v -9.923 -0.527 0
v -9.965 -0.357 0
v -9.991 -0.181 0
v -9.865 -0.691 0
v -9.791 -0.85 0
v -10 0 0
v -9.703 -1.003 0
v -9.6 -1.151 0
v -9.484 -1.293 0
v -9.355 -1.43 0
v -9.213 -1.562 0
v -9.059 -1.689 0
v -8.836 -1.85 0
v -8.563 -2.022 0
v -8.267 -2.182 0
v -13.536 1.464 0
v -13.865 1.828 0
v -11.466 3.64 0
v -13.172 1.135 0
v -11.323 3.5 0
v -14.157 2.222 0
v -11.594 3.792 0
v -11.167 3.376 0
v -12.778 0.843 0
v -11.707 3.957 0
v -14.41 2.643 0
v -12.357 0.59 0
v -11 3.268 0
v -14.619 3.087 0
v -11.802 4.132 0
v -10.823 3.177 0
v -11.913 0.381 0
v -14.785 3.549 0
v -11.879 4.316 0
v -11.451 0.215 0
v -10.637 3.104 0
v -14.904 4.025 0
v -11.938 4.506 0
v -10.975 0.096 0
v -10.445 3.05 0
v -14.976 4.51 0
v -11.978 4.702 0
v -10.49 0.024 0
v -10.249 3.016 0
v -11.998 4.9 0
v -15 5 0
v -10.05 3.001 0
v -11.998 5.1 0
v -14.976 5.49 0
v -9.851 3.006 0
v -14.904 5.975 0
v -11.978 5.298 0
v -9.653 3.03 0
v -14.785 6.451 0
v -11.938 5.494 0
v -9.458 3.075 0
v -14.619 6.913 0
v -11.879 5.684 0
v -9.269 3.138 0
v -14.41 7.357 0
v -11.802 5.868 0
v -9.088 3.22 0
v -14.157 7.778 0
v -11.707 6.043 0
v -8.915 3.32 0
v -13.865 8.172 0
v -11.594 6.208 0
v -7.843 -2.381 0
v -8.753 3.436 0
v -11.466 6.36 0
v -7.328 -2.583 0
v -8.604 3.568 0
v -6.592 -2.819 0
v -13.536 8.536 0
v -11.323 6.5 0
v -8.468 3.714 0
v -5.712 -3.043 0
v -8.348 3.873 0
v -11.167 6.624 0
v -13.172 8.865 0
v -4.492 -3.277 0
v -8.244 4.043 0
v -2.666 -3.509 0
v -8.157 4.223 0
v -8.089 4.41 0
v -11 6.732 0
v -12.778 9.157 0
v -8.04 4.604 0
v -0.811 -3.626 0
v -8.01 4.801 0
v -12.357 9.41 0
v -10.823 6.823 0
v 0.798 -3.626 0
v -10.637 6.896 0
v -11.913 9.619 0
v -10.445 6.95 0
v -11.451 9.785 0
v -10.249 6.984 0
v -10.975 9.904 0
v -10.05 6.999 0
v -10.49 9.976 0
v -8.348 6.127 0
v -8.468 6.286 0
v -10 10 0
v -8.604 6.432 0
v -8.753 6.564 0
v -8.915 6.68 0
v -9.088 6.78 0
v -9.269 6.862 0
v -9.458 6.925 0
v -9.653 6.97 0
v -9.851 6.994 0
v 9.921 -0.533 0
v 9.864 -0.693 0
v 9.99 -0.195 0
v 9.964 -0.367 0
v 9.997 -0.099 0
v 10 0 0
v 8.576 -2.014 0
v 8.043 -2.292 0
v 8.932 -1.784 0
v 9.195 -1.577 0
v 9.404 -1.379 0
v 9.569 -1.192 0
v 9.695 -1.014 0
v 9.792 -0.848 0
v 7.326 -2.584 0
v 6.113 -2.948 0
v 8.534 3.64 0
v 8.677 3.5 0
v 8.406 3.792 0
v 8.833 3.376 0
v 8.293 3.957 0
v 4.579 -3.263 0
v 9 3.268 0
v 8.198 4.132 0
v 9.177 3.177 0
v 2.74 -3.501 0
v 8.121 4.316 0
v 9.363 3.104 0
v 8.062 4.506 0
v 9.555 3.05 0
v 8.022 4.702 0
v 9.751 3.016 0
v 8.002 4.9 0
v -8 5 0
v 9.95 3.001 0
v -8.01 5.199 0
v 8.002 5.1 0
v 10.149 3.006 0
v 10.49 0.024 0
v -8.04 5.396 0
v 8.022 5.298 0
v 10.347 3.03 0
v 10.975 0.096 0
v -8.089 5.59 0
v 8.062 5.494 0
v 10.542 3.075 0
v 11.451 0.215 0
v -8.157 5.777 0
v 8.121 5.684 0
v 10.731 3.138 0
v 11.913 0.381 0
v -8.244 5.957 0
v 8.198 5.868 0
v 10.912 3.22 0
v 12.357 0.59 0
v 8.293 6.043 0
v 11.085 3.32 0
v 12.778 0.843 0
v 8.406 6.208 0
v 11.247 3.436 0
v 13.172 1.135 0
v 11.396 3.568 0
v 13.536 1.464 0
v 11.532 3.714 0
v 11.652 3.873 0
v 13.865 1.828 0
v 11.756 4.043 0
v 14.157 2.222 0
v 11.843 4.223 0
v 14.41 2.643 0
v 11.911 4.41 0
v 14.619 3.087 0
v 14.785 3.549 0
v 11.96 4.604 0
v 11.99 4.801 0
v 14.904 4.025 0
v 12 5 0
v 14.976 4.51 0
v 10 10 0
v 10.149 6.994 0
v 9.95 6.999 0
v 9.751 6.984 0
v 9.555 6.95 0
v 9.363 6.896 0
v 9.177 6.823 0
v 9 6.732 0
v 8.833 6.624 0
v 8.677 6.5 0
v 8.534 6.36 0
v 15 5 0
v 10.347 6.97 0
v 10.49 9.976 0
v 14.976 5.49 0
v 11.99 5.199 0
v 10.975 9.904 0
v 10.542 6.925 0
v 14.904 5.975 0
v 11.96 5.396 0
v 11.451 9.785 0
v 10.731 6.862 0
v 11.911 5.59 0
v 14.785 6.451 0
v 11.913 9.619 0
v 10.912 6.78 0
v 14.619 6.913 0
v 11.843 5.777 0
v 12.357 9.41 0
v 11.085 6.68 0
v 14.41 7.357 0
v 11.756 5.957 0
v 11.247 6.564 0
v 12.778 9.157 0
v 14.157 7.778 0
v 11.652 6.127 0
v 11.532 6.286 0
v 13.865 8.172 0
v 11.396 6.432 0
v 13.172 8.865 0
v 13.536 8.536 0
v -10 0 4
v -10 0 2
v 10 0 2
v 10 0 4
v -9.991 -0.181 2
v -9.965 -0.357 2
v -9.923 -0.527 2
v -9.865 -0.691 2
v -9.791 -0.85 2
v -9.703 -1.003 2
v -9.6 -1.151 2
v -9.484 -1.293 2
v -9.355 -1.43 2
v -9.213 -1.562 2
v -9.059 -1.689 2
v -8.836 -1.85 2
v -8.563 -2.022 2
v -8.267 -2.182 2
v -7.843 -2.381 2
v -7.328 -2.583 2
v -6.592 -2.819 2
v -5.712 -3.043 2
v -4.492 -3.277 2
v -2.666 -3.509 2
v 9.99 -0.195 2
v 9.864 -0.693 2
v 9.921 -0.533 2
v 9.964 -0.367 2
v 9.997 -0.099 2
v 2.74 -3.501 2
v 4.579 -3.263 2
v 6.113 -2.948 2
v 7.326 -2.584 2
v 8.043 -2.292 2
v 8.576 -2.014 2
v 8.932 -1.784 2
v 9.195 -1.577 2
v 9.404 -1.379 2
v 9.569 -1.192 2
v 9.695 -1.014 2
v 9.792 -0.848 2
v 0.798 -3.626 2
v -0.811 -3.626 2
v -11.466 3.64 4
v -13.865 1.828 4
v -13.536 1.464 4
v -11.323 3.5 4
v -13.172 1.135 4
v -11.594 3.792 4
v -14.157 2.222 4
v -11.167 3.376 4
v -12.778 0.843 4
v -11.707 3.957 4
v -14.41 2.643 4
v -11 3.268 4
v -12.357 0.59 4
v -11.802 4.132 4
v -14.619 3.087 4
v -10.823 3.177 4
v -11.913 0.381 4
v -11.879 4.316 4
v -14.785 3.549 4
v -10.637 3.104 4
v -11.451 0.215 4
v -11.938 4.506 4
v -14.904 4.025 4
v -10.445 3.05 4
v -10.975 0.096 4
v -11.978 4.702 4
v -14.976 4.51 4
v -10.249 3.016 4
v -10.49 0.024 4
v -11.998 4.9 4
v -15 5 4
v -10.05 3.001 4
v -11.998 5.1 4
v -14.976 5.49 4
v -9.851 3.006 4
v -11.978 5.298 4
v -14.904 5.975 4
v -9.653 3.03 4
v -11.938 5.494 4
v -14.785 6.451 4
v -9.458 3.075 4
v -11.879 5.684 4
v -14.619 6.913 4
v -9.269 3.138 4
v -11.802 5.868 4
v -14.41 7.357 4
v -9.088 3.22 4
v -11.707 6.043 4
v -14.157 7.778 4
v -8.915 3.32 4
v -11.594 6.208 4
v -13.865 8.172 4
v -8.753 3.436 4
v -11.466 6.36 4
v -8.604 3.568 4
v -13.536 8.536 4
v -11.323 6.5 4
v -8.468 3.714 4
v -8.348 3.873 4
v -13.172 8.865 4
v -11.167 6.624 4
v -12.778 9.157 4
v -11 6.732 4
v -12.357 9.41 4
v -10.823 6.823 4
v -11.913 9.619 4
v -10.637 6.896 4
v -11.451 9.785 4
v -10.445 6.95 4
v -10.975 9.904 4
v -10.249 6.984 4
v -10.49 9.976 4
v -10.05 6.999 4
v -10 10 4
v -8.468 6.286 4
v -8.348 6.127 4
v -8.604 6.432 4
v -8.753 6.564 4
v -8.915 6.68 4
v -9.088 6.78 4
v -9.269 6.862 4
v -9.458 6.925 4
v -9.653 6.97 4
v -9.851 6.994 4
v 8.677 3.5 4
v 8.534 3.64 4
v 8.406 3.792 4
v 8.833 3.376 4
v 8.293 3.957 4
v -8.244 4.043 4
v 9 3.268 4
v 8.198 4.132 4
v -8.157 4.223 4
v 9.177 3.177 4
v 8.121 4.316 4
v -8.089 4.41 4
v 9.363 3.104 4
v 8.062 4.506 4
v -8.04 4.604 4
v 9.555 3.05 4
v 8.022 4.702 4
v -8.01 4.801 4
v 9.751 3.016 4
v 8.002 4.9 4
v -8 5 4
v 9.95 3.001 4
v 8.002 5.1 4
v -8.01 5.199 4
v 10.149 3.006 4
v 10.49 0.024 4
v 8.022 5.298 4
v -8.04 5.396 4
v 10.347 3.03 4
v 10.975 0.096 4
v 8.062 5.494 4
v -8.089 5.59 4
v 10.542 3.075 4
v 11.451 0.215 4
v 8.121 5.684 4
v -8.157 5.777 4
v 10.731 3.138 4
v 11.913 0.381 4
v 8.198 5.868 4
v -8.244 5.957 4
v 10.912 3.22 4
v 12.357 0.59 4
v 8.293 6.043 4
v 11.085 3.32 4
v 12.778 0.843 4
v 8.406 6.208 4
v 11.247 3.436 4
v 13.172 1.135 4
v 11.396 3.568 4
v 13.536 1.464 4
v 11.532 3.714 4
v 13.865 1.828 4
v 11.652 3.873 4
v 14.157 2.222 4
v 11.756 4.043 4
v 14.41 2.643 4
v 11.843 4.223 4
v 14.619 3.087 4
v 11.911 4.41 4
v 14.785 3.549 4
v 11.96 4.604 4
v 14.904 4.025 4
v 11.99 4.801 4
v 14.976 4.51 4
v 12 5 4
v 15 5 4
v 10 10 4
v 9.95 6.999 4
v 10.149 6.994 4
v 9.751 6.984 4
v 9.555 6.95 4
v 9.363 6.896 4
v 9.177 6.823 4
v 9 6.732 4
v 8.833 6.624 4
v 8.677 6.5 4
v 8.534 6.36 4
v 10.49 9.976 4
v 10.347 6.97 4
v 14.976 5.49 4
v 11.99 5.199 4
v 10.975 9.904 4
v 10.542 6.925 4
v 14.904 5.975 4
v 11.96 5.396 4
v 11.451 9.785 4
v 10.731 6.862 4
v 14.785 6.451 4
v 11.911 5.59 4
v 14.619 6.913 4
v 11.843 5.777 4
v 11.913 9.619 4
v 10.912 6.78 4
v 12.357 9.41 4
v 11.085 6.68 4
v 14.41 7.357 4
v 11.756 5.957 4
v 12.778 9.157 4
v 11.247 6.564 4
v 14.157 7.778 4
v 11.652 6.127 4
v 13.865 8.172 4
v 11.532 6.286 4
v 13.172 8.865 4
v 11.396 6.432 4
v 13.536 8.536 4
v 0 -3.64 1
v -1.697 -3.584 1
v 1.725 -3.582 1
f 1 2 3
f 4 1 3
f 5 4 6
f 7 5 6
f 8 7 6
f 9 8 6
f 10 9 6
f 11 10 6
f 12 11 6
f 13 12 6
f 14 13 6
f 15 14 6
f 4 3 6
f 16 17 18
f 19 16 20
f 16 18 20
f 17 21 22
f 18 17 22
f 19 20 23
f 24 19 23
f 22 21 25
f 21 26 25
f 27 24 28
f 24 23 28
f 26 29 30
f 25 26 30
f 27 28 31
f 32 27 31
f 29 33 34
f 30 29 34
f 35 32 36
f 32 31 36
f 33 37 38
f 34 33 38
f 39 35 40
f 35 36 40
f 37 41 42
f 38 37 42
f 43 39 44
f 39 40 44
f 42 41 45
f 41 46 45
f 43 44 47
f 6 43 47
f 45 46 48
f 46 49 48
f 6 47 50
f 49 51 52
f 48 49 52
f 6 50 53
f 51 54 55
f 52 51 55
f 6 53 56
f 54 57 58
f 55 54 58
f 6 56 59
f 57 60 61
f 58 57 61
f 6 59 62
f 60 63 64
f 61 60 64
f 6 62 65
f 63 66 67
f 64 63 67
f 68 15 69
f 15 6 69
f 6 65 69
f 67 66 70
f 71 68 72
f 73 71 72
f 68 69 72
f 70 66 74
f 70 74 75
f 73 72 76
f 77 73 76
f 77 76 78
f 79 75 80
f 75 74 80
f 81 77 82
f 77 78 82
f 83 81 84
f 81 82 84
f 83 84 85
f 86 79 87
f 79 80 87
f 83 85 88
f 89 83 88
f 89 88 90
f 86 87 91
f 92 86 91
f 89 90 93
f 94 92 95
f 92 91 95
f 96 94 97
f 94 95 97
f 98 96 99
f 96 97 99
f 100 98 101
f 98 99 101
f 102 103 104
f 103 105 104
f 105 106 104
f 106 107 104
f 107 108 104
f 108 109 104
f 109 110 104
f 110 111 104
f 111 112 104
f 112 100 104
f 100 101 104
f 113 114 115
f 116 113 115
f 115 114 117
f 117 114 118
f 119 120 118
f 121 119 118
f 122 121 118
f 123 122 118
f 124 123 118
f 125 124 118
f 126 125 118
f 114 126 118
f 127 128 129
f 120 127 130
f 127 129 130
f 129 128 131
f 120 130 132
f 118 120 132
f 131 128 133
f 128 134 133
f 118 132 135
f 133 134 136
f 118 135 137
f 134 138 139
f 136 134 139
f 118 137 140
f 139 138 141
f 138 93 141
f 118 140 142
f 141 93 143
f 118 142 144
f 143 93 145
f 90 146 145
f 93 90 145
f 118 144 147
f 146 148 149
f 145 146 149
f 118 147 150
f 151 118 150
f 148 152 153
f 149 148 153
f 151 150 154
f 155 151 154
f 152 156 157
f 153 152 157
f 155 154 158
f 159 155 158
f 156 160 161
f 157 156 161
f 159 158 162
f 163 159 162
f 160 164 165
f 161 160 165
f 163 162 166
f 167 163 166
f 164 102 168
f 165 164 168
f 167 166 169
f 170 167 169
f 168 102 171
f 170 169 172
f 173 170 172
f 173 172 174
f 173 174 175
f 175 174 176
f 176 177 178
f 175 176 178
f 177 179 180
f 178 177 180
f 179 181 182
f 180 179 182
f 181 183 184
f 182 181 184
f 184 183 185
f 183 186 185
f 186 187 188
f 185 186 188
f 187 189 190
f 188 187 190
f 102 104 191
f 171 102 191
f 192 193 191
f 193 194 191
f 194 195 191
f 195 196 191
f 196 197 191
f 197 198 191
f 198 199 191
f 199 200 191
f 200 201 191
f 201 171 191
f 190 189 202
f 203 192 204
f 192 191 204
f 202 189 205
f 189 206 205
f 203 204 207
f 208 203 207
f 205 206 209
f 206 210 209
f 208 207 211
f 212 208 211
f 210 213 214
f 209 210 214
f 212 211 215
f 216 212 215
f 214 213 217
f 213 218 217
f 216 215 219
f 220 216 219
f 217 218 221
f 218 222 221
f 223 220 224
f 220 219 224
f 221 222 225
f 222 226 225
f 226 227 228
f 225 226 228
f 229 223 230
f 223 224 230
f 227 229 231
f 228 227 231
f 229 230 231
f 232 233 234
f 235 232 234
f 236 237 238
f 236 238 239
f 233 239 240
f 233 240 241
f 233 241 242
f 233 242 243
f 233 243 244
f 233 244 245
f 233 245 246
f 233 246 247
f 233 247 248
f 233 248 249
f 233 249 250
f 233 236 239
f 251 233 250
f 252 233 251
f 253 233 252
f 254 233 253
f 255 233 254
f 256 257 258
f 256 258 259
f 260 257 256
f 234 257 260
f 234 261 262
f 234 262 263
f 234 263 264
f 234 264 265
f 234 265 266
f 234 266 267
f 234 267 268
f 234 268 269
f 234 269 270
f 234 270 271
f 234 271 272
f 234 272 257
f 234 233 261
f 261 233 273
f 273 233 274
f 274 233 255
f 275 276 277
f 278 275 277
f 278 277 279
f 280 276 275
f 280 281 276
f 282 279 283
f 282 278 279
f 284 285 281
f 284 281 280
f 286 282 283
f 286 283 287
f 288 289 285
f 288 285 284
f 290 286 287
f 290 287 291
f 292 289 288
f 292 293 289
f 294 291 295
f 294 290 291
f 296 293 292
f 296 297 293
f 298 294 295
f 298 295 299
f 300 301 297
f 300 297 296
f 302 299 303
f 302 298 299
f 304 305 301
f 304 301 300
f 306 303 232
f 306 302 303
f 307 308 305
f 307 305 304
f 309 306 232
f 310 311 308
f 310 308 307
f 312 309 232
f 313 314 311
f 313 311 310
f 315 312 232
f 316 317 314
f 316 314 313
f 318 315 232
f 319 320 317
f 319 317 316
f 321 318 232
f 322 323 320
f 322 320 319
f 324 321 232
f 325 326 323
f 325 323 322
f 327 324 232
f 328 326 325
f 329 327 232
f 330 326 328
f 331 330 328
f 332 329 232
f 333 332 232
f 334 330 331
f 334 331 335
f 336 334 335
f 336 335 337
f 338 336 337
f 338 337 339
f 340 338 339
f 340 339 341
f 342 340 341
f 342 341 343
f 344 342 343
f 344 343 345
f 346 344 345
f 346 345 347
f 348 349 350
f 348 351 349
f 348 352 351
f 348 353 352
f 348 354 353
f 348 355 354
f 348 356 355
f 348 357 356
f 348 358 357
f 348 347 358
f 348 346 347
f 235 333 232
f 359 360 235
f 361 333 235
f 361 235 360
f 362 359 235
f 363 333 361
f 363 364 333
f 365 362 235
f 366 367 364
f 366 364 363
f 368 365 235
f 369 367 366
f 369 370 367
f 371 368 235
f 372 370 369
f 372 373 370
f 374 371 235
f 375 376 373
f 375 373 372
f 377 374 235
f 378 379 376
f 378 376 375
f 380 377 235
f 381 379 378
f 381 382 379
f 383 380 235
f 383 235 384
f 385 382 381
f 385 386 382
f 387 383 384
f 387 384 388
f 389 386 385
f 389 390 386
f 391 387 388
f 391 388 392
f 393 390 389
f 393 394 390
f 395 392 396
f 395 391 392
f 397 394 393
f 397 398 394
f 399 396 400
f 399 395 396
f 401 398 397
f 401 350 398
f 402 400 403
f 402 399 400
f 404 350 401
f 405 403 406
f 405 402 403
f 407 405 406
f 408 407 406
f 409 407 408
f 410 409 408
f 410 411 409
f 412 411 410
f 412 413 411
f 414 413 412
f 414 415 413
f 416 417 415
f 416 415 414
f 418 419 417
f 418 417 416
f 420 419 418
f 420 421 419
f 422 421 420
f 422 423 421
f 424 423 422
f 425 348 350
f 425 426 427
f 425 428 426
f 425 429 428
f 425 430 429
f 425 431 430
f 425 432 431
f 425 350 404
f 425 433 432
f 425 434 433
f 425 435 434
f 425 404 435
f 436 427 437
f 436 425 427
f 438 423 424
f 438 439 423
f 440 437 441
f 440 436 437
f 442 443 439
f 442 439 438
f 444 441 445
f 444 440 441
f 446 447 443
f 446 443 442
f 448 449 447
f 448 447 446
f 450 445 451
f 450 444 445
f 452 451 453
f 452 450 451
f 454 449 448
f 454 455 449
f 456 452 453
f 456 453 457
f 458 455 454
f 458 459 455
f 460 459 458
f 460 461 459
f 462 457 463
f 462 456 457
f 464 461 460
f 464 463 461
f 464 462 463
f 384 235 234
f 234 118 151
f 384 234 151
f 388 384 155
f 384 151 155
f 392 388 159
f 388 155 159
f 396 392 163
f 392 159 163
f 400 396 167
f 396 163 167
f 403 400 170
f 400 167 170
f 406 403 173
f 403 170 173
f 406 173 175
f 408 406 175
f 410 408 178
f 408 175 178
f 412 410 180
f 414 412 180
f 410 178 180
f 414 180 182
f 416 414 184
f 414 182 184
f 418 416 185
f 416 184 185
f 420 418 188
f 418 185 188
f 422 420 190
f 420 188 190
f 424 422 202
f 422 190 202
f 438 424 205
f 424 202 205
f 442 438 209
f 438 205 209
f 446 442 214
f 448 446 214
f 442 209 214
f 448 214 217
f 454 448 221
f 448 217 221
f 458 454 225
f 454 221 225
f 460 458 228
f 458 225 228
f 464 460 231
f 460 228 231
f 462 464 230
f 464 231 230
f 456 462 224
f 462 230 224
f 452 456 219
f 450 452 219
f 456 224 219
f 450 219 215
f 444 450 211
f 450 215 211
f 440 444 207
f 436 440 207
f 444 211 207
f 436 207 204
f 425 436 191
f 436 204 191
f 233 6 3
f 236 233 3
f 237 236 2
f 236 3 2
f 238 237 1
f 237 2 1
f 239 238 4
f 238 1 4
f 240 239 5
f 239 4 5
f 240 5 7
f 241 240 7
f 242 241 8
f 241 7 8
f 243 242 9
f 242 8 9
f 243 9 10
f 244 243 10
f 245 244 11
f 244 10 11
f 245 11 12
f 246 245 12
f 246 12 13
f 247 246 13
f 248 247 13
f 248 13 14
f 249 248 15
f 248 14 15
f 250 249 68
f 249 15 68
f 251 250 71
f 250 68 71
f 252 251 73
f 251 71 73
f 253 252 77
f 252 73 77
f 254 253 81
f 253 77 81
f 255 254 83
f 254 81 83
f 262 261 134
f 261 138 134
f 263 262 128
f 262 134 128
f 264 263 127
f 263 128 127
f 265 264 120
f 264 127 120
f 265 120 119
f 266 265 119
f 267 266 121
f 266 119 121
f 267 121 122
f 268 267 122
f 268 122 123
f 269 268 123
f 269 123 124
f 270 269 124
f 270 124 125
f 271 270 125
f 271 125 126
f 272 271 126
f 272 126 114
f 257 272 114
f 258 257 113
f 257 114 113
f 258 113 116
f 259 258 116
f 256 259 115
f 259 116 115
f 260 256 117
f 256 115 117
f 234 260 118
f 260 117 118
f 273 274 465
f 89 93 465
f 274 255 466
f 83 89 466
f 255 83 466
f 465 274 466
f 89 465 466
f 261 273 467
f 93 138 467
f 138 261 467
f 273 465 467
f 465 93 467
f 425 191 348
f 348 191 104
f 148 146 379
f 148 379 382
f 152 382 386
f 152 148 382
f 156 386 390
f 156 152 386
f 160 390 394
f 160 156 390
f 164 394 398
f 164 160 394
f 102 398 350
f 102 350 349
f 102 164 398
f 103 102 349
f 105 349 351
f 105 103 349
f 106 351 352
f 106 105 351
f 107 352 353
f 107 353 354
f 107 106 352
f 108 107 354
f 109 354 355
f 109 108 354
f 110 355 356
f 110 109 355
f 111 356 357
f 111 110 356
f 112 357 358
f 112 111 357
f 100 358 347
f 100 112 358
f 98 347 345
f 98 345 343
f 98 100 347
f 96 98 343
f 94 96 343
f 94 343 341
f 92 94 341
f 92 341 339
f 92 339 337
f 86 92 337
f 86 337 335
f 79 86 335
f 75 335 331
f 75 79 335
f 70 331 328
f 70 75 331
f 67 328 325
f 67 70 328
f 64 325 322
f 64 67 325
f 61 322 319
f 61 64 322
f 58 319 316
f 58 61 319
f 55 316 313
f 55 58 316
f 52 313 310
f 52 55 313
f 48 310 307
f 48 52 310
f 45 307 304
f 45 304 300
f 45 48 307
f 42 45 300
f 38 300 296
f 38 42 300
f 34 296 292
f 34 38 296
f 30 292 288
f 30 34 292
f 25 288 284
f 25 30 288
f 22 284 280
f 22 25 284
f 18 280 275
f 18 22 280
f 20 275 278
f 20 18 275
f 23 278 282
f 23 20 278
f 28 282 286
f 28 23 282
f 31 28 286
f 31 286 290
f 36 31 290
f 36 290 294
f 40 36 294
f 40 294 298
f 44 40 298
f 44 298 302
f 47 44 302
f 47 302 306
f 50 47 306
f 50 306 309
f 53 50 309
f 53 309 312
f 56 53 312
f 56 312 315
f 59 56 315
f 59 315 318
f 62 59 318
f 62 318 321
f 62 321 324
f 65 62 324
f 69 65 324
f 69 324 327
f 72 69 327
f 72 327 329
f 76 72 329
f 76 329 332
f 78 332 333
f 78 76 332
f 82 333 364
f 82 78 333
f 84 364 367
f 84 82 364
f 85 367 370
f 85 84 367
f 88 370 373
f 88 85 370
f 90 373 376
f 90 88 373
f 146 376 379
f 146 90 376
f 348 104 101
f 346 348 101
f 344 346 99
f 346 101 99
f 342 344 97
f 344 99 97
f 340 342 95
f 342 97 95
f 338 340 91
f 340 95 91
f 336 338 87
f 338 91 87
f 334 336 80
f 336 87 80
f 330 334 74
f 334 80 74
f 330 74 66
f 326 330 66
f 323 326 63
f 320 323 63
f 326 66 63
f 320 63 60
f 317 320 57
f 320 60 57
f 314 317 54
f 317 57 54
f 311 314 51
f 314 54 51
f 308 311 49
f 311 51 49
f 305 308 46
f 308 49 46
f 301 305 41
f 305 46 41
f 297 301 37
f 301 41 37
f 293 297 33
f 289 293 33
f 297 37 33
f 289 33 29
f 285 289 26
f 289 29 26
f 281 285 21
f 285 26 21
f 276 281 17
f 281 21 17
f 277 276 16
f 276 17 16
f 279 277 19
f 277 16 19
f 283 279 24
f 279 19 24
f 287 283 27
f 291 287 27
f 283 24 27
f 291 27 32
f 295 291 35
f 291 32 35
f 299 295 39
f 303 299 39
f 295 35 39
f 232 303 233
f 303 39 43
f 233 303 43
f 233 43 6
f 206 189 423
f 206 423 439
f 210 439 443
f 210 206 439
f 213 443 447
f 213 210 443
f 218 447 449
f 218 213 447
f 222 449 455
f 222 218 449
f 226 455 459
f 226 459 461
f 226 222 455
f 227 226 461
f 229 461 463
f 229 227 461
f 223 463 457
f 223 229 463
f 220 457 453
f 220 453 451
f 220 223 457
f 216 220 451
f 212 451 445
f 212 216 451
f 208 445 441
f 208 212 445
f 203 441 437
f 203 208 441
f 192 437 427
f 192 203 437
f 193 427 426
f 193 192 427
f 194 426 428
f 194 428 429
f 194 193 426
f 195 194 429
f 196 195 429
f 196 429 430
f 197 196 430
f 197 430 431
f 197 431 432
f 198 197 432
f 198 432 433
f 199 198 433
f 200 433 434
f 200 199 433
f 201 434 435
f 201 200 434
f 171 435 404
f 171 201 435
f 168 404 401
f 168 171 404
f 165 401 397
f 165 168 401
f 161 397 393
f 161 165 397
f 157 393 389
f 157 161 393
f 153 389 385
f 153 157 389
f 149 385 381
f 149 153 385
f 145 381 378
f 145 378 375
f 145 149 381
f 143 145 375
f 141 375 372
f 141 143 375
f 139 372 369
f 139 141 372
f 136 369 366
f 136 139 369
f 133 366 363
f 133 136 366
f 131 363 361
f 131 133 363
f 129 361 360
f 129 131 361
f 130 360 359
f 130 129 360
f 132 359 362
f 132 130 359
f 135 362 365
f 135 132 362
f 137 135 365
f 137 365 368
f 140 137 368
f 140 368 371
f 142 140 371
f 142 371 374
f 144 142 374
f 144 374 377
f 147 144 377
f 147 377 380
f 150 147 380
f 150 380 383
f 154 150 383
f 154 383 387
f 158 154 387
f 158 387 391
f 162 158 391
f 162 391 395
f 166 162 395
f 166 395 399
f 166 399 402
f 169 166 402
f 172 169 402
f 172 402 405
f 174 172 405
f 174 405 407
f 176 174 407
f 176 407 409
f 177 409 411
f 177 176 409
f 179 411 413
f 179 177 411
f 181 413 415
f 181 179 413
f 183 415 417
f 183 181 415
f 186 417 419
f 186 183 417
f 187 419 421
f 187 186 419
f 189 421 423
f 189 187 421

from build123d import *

# Parameters (mm, degrees)
F1_DEPTH = 2
F0_R     = 2
F2_DEPTH = 4


with BuildPart() as f1:
    # F0 (on Top) → F1 (new body)
    with BuildSketch(Plane.XY):
        with BuildLine():
            Line((10, 0), (-10, 0))
            add(Edge.make_bspline(
                [(-10, 0), (-10, -3), (-3, -3.639702), (0, -3.639702)],
                knots=[0, 0, 0, 0, 10.641778, 10.641778, 10.641778, 10.641778], degree=3))
            add(Edge.make_bspline(
                [(10, 0), (10, -3), (3, -3.639702), (0, -3.639702)],
                knots=[0, 0, 0, 0, 10.641778, 10.641778, 10.641778, 10.641778], degree=3))
        make_face()
    extrude(amount=F1_DEPTH)

    # F0 (on Top) → F2 (join)
    with BuildSketch(Plane.XY):
        with BuildLine():
            Line((10, 10), (0, 10))
            Line((0, 10), (-10, 10))
            ThreePointArc((-10, 10), (-15, 5), (-10, 0))
            Line((-10, 0), (10, 0))
            ThreePointArc((10, 0), (15, 5), (10, 10))
        make_face()
        with Locations((-10, 5)):
            Circle(F0_R, mode=Mode.SUBTRACT)
        with Locations((10, 5)):
            Circle(F0_R, mode=Mode.SUBTRACT)
    extrude(amount=F2_DEPTH)


solid = f1.part
